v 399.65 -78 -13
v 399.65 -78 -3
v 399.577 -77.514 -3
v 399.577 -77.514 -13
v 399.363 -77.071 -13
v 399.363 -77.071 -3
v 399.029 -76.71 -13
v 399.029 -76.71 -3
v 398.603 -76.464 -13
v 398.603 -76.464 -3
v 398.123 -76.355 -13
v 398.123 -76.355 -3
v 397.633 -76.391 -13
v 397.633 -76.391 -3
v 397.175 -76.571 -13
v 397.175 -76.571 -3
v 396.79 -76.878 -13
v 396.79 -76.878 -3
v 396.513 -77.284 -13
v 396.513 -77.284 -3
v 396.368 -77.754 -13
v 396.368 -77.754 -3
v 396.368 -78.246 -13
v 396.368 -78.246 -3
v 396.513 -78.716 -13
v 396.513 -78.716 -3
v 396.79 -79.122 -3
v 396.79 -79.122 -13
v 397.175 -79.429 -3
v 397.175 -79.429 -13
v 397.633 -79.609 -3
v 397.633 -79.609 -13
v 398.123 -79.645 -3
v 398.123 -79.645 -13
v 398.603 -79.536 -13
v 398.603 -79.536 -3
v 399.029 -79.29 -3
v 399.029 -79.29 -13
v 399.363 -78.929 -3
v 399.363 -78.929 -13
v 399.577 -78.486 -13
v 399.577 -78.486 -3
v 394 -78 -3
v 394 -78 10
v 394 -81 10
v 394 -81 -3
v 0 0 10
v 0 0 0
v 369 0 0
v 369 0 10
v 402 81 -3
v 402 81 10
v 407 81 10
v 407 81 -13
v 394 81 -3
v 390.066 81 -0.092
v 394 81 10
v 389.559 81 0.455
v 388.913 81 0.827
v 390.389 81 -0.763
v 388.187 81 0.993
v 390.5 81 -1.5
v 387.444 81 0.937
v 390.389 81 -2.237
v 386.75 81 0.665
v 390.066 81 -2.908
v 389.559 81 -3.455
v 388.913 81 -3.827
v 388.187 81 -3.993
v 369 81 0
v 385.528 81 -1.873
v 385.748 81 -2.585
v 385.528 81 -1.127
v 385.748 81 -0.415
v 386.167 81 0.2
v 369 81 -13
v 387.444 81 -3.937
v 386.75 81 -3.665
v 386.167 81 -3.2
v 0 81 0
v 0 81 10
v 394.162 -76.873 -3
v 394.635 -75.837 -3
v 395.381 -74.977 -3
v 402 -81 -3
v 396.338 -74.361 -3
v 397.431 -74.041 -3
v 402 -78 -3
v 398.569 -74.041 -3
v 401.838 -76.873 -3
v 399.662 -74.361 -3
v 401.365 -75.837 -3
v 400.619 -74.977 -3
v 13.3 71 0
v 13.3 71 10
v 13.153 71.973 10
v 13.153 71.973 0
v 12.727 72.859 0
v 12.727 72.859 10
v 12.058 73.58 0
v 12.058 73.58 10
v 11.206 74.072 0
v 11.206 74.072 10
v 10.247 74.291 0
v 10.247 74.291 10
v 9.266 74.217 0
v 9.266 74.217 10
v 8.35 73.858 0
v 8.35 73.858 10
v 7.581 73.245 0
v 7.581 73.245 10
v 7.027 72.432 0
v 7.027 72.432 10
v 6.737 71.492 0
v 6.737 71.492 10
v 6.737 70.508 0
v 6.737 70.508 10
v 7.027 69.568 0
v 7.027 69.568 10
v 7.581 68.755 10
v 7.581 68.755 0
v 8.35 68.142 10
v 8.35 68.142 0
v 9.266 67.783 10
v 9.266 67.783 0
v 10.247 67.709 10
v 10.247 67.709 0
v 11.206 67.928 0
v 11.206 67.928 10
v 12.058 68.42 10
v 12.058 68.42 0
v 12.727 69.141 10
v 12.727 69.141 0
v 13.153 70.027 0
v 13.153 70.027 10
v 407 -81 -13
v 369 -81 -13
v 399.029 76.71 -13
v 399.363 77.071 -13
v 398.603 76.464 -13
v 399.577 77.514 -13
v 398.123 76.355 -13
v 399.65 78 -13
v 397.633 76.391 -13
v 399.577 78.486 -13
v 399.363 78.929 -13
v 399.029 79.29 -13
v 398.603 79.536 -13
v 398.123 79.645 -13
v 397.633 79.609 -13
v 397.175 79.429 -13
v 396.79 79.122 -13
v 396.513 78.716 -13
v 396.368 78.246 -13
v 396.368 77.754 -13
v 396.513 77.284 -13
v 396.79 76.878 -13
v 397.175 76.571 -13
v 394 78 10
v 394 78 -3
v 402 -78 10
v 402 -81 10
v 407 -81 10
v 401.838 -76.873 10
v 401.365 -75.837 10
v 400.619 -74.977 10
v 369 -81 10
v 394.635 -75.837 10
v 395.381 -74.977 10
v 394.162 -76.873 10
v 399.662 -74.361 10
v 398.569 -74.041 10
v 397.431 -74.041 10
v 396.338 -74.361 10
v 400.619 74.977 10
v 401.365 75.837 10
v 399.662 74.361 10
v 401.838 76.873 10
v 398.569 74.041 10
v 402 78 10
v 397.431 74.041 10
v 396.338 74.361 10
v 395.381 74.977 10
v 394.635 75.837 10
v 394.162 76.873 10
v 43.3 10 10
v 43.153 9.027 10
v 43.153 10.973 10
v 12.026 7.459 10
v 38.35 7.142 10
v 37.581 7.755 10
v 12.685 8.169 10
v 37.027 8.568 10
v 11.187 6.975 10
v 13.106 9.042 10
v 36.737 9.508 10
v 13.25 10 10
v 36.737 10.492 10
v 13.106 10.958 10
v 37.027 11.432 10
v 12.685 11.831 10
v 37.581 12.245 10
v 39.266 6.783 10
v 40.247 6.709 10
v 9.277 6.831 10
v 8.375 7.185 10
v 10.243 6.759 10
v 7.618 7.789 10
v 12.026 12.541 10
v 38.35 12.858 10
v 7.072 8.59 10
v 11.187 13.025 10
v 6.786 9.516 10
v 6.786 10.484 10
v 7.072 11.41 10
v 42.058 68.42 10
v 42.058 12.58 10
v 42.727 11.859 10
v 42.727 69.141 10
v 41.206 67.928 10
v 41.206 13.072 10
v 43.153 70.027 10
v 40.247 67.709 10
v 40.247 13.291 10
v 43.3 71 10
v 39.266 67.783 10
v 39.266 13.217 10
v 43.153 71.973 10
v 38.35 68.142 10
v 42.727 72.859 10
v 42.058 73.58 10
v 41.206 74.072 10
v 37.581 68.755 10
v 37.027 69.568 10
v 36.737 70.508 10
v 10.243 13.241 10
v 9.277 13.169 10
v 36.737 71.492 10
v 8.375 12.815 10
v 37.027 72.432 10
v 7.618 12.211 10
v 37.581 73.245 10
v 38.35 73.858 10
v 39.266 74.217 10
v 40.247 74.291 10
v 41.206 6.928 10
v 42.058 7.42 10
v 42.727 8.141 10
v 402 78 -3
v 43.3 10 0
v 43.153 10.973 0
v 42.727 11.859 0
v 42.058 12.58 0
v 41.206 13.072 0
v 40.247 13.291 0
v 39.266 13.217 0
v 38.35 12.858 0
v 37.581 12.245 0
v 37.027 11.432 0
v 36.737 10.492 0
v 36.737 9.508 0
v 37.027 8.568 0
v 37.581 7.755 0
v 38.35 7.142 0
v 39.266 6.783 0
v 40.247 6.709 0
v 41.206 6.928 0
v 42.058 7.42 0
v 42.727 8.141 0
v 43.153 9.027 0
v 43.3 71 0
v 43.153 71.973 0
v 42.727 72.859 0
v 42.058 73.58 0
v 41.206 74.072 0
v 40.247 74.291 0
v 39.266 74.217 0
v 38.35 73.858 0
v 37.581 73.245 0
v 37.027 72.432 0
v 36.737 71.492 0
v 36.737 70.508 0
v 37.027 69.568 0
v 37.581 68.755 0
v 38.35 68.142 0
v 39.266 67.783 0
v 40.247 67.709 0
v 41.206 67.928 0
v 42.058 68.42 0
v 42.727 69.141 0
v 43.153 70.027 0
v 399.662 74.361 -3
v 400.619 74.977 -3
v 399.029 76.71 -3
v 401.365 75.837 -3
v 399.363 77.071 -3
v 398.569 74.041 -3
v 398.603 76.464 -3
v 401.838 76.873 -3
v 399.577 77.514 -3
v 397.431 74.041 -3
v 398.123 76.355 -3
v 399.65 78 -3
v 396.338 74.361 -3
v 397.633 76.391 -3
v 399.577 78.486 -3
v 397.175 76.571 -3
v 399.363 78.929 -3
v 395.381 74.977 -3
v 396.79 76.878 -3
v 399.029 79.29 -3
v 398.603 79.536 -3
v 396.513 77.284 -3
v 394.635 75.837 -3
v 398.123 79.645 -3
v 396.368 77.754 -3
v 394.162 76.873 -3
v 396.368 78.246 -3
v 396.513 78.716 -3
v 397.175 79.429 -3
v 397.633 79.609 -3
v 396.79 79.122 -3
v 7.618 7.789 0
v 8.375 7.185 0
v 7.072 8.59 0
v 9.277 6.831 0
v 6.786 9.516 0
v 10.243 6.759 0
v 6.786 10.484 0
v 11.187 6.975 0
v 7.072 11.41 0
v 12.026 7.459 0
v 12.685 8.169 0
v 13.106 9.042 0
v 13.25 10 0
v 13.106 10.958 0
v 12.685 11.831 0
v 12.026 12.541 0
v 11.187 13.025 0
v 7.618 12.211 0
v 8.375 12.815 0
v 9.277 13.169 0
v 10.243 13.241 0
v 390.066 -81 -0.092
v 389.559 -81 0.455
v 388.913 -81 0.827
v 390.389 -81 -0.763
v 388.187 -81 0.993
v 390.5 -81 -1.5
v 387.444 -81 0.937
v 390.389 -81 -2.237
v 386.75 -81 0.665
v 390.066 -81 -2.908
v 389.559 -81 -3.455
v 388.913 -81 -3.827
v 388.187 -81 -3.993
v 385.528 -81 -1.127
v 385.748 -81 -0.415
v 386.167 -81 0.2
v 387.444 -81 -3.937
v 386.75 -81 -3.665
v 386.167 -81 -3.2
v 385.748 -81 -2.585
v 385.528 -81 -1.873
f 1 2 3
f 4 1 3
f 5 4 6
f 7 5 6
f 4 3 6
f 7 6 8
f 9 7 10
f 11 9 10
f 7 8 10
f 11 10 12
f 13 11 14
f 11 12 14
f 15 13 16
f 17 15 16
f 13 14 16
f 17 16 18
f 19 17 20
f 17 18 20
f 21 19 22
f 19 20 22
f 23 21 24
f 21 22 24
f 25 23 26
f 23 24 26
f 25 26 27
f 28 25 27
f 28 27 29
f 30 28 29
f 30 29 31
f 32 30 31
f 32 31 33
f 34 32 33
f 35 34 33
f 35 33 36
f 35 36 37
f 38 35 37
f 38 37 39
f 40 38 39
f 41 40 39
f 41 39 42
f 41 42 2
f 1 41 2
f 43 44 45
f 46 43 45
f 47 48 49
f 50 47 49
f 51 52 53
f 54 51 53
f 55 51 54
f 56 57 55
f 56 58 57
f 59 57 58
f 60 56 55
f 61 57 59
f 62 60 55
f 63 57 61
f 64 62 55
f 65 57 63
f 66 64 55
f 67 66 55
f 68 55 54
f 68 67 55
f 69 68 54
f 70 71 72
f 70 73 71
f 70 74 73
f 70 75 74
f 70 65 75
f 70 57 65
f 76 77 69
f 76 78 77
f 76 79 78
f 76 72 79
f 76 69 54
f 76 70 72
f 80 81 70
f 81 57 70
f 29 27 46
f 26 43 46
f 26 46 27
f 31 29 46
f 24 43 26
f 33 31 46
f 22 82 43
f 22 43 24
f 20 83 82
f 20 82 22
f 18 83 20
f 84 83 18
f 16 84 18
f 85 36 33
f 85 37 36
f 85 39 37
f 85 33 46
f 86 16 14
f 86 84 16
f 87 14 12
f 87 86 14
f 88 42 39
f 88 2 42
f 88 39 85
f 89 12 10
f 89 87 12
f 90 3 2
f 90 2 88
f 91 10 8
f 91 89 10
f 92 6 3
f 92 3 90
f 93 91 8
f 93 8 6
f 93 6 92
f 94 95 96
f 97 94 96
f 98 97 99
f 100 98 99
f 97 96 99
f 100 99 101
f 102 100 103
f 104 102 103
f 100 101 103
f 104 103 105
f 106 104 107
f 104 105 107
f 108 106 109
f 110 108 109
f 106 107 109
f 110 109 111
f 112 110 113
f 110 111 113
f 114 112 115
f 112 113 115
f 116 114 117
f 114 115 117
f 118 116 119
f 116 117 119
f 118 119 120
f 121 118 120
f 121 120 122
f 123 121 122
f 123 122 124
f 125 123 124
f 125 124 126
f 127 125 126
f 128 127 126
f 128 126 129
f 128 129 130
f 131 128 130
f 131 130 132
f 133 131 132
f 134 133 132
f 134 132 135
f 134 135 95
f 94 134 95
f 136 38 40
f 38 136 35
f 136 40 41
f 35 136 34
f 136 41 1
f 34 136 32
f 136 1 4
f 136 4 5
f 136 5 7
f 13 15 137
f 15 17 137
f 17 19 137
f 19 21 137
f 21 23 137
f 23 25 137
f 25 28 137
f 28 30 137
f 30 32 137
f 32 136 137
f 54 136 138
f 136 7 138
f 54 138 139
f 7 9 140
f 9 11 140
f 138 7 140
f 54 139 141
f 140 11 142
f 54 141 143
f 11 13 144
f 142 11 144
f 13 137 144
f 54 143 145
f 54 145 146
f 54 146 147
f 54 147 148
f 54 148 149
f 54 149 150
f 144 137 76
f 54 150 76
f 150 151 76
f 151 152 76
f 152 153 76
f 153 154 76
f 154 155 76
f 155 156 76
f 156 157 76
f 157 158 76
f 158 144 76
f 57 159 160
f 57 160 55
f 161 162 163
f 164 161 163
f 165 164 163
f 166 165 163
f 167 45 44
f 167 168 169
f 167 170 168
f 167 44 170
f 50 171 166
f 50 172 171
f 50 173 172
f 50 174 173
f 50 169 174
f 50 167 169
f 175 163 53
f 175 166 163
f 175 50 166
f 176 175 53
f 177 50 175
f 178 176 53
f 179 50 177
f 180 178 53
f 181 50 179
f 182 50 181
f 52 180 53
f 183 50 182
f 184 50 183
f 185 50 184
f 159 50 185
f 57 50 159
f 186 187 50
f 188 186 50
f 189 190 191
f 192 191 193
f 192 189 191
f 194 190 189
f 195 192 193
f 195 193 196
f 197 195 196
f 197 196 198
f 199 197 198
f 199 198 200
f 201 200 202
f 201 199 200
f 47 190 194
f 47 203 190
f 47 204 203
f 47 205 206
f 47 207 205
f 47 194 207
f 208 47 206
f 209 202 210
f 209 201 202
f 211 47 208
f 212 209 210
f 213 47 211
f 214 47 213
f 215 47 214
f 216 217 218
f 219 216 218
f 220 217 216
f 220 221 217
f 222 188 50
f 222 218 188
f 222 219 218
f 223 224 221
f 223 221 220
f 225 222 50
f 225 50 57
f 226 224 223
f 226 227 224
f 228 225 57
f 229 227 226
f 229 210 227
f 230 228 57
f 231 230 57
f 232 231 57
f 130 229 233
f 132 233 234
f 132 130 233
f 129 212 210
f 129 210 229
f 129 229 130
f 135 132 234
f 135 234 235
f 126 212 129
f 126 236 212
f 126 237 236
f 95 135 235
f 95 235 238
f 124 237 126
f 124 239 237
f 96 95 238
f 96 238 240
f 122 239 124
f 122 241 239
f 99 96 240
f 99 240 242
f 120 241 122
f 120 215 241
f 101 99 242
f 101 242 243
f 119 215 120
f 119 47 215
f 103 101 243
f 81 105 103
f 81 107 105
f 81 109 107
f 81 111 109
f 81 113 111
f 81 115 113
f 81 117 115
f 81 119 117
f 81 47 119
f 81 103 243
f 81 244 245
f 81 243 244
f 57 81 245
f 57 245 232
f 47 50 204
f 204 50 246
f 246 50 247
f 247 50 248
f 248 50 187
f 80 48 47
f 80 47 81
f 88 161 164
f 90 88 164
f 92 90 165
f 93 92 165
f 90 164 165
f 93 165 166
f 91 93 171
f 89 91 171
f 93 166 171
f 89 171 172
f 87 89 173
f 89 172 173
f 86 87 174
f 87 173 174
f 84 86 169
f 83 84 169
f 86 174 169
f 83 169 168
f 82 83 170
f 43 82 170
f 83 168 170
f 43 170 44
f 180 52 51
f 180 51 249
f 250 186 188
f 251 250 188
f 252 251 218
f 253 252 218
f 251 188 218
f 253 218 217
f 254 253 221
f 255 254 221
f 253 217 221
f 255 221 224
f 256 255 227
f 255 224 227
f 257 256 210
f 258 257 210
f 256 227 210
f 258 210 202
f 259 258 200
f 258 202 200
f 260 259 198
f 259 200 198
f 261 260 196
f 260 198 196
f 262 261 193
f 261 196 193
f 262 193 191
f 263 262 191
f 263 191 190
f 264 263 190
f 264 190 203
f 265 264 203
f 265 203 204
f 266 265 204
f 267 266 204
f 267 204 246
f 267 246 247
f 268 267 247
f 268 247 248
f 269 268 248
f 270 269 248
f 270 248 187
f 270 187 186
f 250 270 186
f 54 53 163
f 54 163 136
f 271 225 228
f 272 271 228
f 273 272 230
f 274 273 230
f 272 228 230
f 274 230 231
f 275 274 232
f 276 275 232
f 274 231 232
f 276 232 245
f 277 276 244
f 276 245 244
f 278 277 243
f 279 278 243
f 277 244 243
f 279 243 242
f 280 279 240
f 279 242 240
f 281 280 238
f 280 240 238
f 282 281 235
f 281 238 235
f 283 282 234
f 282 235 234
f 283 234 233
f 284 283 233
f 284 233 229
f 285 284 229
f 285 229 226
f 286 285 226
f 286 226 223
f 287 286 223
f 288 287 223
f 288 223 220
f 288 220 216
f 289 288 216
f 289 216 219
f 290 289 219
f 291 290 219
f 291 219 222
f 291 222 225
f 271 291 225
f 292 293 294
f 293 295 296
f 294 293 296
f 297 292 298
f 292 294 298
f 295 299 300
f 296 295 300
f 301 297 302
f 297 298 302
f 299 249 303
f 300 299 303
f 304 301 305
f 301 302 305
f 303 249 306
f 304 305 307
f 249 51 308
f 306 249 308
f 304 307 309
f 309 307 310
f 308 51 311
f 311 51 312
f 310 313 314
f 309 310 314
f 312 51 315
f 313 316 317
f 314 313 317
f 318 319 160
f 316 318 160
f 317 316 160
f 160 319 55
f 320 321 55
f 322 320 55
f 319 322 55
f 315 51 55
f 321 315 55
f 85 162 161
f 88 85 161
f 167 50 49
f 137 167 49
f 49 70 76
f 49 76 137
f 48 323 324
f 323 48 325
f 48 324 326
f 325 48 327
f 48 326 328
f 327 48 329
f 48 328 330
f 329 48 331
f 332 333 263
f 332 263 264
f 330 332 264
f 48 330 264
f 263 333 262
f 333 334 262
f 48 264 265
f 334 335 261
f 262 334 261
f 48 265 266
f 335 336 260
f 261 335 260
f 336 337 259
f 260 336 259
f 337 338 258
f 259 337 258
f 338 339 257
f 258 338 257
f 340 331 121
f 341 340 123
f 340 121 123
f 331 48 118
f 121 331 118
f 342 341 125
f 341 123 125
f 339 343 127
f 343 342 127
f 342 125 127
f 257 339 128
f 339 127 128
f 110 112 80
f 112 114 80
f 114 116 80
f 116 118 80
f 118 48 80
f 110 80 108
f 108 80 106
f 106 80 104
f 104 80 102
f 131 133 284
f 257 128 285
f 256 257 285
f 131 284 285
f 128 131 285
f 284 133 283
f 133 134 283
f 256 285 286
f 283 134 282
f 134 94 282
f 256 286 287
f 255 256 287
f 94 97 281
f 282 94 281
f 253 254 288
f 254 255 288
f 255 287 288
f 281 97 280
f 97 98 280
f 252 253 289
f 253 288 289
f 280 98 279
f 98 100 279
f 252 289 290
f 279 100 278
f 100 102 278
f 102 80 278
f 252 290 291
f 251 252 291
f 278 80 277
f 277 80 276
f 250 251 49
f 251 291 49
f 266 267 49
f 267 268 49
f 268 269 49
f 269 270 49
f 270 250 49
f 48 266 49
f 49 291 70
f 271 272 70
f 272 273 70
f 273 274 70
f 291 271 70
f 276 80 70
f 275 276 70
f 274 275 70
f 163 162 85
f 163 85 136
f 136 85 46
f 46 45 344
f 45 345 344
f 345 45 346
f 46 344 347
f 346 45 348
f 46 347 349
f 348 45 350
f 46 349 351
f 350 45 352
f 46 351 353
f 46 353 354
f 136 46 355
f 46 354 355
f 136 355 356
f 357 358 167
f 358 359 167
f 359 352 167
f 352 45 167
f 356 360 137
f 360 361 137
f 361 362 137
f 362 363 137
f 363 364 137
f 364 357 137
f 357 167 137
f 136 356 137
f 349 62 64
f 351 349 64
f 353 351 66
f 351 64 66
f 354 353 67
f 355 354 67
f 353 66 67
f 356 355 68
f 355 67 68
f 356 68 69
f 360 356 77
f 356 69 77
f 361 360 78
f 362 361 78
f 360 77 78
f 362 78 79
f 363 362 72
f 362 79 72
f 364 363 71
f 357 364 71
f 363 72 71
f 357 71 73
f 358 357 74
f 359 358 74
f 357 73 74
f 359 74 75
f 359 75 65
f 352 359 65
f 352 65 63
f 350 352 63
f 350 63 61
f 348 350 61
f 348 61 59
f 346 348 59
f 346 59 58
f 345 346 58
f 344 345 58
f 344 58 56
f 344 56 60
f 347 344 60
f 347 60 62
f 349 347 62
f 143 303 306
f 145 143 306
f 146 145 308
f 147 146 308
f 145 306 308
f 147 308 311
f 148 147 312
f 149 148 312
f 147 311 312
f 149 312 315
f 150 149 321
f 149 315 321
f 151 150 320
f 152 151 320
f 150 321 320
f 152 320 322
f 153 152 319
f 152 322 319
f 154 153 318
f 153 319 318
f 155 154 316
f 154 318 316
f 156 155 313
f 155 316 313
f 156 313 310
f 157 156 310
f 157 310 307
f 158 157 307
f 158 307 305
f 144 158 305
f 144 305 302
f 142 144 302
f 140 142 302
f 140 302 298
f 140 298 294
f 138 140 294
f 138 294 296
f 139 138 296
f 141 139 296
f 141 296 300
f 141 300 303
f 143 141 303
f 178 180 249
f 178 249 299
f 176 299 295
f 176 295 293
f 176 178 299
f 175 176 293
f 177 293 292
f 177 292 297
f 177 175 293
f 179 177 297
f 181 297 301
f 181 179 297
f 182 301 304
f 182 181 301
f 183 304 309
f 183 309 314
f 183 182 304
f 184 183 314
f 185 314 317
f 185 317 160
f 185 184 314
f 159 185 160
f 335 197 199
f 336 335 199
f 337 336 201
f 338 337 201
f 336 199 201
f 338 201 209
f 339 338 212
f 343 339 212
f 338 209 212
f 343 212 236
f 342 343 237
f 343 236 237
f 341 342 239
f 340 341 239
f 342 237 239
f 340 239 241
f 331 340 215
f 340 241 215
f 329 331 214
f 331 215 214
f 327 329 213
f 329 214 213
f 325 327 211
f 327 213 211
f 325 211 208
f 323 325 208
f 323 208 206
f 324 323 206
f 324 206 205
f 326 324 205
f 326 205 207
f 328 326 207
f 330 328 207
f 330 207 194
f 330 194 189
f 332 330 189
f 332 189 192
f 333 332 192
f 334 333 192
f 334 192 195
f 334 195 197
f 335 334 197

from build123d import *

# Parameters (mm, degrees)
SKETCH1_W           = 369
SKETCH1_H           = 81
BOSS_EXTRUDE1_DEPTH = 10
SKETCH2_W           = 23
SKETCH2_H           = 162
BOSS_EXTRUDE2_DEPTH = 38
SKETCH3_R           = 2.5
CUT_EXTRUDE1_DEPTH  = 163
SKETCH4_R           = 1.65
CUT_EXTRUDE2_DEPTH  = 24
CUT_EXTRUDE4_DEPTH  = 13
SKETCH6_R           = 3.3
SKETCH6_R_2         = 3.25
CUT_EXTRUDE5_DEPTH  = 13


with BuildPart() as part:
    # Sketch1 → Boss-Extrude1 (new body)
    with BuildSketch(Plane.XY):
        with Locations((184.5, 40.5)):
            Rectangle(SKETCH1_W, SKETCH1_H)
    extrude(amount=BOSS_EXTRUDE1_DEPTH)

    # Sketch2 → Boss-Extrude2 (add)
    with BuildSketch(Plane(origin=(369, 0, 0), x_dir=(0, 0, -1), z_dir=(1, 0, 0))):
        with Locations((1.5, 0)):
            Rectangle(SKETCH2_W, SKETCH2_H)
    extrude(amount=BOSS_EXTRUDE2_DEPTH)

    # Sketch3 → Cut-Extrude1 (cut, through all)
    with BuildSketch(Plane(origin=(0, 81, 0), x_dir=(1, 0, 0), z_dir=(0, 1, 0))):
        with Locations((388, 1.5)):
            Circle(SKETCH3_R)
    extrude(amount=-CUT_EXTRUDE1_DEPTH, mode=Mode.SUBTRACT)

    # Sketch4 → Cut-Extrude2 (cut, through all)
    with BuildSketch(Plane.XY.offset(10)):
        with Locations((398, -78)):
            Circle(SKETCH4_R)
        with Locations((398, 78)):
            Circle(SKETCH4_R)
    extrude(amount=-CUT_EXTRUDE2_DEPTH, mode=Mode.SUBTRACT)

    # Sketch5 → Cut-Extrude4 (cut)
    with BuildSketch(Plane.XY.offset(10)):
        with BuildLine():
            Line((394, 78), (394, 81))
            Line((394, 81), (402, 81))
            Line((402, 81), (402, 78))
            ThreePointArc((402, 78), (398, 74), (394, 78))
        make_face()
        with BuildLine():
            Line((394, -78), (394, -81))
            Line((394, -81), (402, -81))
            Line((402, -81), (402, -78))
            ThreePointArc((402, -78), (398, -74), (394, -78))
        make_face()
    extrude(amount=-CUT_EXTRUDE4_DEPTH, mode=Mode.SUBTRACT)

    # Sketch6 → Cut-Extrude5 (cut)
    with BuildSketch(Plane.XY.offset(10)):
        with Locations((10, 71)):
            Circle(SKETCH6_R)
        with Locations((40, 71)):
            Circle(SKETCH6_R)
        with Locations((40, 10)):
            Circle(SKETCH6_R)
        with Locations((10, 10)):
            Circle(SKETCH6_R_2)
    extrude(amount=-CUT_EXTRUDE5_DEPTH, mode=Mode.SUBTRACT)


solid = part.part
